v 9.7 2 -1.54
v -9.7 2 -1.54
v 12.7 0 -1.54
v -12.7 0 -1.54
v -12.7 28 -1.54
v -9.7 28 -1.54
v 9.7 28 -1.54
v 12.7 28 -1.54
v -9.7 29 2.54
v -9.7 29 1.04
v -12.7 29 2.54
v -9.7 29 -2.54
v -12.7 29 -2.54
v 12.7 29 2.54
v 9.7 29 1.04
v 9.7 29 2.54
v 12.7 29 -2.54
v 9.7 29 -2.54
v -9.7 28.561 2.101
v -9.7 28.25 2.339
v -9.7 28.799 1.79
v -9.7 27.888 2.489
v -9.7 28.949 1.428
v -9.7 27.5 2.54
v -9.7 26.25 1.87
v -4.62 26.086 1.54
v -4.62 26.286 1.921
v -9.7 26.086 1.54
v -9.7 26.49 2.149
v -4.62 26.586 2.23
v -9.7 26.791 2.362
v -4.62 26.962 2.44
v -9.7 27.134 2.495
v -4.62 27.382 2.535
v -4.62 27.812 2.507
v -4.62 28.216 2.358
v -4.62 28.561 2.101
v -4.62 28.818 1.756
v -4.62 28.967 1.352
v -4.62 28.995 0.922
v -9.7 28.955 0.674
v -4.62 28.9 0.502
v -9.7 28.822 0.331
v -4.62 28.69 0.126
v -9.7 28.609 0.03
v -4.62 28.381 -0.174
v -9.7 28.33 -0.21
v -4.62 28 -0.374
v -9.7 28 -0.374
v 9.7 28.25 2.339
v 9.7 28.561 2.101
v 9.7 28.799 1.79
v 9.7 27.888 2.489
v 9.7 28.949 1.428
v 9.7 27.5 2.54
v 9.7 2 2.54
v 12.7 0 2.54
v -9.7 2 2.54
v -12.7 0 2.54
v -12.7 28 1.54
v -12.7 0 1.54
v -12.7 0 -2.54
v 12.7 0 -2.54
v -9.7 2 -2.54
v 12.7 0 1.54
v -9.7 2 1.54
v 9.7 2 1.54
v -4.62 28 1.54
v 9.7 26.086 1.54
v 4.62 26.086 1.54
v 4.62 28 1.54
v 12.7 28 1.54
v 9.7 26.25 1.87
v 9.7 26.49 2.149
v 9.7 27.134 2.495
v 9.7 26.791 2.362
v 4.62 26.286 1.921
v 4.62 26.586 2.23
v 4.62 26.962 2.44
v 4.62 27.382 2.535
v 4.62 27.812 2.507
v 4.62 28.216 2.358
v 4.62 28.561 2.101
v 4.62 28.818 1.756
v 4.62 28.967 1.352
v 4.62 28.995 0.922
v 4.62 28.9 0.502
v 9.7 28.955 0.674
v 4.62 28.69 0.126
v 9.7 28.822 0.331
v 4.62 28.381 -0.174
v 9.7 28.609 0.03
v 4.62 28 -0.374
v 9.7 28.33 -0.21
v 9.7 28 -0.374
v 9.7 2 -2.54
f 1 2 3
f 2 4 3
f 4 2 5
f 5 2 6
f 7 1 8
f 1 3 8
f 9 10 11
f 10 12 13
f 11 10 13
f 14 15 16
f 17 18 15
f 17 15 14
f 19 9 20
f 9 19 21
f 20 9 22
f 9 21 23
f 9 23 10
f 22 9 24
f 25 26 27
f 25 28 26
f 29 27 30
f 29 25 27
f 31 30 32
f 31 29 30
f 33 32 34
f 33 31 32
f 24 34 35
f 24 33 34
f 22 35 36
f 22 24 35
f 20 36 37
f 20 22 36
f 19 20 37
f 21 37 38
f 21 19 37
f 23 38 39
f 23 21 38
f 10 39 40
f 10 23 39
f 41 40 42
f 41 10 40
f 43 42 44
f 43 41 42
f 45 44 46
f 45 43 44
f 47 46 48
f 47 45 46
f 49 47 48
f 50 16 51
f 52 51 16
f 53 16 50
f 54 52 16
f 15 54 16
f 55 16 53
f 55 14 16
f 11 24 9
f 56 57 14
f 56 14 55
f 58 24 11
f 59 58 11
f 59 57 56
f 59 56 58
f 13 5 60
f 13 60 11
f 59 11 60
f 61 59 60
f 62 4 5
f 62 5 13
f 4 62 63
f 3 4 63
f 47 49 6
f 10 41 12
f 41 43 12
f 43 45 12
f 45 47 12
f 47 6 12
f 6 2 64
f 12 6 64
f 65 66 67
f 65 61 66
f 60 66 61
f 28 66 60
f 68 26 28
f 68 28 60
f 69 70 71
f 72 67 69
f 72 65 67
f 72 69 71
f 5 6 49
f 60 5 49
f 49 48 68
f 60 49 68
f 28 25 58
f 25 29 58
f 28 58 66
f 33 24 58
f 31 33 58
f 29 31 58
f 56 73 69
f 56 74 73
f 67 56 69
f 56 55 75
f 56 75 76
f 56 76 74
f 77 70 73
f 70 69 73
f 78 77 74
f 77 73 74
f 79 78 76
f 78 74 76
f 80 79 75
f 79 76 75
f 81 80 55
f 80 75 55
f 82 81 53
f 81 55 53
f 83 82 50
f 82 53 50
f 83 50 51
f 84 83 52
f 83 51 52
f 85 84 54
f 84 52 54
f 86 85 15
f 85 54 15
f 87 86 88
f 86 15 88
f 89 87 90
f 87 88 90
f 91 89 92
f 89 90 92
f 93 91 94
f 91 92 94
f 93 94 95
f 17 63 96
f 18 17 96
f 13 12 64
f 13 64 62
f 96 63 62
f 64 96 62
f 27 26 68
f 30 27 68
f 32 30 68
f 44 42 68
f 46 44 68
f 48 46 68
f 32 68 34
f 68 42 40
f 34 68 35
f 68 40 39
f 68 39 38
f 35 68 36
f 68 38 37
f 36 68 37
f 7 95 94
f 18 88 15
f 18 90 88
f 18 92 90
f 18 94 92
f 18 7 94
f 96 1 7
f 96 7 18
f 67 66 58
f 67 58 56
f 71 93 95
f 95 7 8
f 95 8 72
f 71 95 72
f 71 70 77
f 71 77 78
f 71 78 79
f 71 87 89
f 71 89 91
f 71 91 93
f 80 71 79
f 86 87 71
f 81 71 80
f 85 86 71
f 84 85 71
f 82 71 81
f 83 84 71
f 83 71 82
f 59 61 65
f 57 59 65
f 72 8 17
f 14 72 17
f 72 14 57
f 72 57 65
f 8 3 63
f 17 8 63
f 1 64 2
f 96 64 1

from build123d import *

# Parameters (mm, degrees)
SKETCH1_W               = 25.4
SKETCH1_H               = 5.08
BOSS_EXTRUDE1_DEPTH     = 2
SKETCH2_W               = 3
SKETCH2_H               = 5.08
BOSS_EXTRUDE2_DEPTH     = 27
SKETCH3_R               = 1.5
BOSS_EXTRUDE3_DEPTH     = 5.08
CUT_EXTRUDE1_DEPTH      = 39.634331882
CUT_EXTRUDE1_DEPTH_BACK = 39.634331882
SKETCH4_W               = 3.08
SKETCH4_H               = 28


with BuildPart() as part:
    # Sketch1 → Boss-Extrude1 (new body)
    with BuildSketch(Plane(origin=(0, 0, 0), x_dir=(1, 0, 0), z_dir=(0, 1, 0))):
        Rectangle(SKETCH1_W, SKETCH1_H)
    extrude(amount=BOSS_EXTRUDE1_DEPTH)

    # Sketch2 → Boss-Extrude2 (add)
    with BuildSketch(Plane(origin=(0, 2, 0), x_dir=(1, 0, 0), z_dir=(0, 1, 0))):
        with Locations((11.2, 0)):
            Rectangle(SKETCH2_W, SKETCH2_H)
    boss_extrude2 = extrude(amount=BOSS_EXTRUDE2_DEPTH)

    # Sketch3 → Boss-Extrude3 (add)
    with BuildSketch(Plane.ZY.offset(-9.7)):
        with Locations((1.04, 27.5)):
            Circle(SKETCH3_R)
    boss_extrude3 = extrude(amount=BOSS_EXTRUDE3_DEPTH)

    # Mirror1: Boss-Extrude2, Boss-Extrude3 across plane
    add(boss_extrude2.mirror(Plane(origin=(0, 0, 0), x_dir=(0, 0, 1), z_dir=(1, 0, 0))))
    add(boss_extrude3.mirror(Plane(origin=(0, 0, 0), x_dir=(0, 0, 1), z_dir=(1, 0, 0))))

    # Sketch4 → Cut-Extrude1 (cut, two sides: drawn at the far end of the back side and taken through both)
    with BuildSketch(Plane.ZY.offset(12.7).offset(-CUT_EXTRUDE1_DEPTH_BACK)):
        with Locations((0, 14)):
            Rectangle(SKETCH4_W, SKETCH4_H)
    extrude(amount=CUT_EXTRUDE1_DEPTH + CUT_EXTRUDE1_DEPTH_BACK, mode=Mode.SUBTRACT)


solid = part.part
